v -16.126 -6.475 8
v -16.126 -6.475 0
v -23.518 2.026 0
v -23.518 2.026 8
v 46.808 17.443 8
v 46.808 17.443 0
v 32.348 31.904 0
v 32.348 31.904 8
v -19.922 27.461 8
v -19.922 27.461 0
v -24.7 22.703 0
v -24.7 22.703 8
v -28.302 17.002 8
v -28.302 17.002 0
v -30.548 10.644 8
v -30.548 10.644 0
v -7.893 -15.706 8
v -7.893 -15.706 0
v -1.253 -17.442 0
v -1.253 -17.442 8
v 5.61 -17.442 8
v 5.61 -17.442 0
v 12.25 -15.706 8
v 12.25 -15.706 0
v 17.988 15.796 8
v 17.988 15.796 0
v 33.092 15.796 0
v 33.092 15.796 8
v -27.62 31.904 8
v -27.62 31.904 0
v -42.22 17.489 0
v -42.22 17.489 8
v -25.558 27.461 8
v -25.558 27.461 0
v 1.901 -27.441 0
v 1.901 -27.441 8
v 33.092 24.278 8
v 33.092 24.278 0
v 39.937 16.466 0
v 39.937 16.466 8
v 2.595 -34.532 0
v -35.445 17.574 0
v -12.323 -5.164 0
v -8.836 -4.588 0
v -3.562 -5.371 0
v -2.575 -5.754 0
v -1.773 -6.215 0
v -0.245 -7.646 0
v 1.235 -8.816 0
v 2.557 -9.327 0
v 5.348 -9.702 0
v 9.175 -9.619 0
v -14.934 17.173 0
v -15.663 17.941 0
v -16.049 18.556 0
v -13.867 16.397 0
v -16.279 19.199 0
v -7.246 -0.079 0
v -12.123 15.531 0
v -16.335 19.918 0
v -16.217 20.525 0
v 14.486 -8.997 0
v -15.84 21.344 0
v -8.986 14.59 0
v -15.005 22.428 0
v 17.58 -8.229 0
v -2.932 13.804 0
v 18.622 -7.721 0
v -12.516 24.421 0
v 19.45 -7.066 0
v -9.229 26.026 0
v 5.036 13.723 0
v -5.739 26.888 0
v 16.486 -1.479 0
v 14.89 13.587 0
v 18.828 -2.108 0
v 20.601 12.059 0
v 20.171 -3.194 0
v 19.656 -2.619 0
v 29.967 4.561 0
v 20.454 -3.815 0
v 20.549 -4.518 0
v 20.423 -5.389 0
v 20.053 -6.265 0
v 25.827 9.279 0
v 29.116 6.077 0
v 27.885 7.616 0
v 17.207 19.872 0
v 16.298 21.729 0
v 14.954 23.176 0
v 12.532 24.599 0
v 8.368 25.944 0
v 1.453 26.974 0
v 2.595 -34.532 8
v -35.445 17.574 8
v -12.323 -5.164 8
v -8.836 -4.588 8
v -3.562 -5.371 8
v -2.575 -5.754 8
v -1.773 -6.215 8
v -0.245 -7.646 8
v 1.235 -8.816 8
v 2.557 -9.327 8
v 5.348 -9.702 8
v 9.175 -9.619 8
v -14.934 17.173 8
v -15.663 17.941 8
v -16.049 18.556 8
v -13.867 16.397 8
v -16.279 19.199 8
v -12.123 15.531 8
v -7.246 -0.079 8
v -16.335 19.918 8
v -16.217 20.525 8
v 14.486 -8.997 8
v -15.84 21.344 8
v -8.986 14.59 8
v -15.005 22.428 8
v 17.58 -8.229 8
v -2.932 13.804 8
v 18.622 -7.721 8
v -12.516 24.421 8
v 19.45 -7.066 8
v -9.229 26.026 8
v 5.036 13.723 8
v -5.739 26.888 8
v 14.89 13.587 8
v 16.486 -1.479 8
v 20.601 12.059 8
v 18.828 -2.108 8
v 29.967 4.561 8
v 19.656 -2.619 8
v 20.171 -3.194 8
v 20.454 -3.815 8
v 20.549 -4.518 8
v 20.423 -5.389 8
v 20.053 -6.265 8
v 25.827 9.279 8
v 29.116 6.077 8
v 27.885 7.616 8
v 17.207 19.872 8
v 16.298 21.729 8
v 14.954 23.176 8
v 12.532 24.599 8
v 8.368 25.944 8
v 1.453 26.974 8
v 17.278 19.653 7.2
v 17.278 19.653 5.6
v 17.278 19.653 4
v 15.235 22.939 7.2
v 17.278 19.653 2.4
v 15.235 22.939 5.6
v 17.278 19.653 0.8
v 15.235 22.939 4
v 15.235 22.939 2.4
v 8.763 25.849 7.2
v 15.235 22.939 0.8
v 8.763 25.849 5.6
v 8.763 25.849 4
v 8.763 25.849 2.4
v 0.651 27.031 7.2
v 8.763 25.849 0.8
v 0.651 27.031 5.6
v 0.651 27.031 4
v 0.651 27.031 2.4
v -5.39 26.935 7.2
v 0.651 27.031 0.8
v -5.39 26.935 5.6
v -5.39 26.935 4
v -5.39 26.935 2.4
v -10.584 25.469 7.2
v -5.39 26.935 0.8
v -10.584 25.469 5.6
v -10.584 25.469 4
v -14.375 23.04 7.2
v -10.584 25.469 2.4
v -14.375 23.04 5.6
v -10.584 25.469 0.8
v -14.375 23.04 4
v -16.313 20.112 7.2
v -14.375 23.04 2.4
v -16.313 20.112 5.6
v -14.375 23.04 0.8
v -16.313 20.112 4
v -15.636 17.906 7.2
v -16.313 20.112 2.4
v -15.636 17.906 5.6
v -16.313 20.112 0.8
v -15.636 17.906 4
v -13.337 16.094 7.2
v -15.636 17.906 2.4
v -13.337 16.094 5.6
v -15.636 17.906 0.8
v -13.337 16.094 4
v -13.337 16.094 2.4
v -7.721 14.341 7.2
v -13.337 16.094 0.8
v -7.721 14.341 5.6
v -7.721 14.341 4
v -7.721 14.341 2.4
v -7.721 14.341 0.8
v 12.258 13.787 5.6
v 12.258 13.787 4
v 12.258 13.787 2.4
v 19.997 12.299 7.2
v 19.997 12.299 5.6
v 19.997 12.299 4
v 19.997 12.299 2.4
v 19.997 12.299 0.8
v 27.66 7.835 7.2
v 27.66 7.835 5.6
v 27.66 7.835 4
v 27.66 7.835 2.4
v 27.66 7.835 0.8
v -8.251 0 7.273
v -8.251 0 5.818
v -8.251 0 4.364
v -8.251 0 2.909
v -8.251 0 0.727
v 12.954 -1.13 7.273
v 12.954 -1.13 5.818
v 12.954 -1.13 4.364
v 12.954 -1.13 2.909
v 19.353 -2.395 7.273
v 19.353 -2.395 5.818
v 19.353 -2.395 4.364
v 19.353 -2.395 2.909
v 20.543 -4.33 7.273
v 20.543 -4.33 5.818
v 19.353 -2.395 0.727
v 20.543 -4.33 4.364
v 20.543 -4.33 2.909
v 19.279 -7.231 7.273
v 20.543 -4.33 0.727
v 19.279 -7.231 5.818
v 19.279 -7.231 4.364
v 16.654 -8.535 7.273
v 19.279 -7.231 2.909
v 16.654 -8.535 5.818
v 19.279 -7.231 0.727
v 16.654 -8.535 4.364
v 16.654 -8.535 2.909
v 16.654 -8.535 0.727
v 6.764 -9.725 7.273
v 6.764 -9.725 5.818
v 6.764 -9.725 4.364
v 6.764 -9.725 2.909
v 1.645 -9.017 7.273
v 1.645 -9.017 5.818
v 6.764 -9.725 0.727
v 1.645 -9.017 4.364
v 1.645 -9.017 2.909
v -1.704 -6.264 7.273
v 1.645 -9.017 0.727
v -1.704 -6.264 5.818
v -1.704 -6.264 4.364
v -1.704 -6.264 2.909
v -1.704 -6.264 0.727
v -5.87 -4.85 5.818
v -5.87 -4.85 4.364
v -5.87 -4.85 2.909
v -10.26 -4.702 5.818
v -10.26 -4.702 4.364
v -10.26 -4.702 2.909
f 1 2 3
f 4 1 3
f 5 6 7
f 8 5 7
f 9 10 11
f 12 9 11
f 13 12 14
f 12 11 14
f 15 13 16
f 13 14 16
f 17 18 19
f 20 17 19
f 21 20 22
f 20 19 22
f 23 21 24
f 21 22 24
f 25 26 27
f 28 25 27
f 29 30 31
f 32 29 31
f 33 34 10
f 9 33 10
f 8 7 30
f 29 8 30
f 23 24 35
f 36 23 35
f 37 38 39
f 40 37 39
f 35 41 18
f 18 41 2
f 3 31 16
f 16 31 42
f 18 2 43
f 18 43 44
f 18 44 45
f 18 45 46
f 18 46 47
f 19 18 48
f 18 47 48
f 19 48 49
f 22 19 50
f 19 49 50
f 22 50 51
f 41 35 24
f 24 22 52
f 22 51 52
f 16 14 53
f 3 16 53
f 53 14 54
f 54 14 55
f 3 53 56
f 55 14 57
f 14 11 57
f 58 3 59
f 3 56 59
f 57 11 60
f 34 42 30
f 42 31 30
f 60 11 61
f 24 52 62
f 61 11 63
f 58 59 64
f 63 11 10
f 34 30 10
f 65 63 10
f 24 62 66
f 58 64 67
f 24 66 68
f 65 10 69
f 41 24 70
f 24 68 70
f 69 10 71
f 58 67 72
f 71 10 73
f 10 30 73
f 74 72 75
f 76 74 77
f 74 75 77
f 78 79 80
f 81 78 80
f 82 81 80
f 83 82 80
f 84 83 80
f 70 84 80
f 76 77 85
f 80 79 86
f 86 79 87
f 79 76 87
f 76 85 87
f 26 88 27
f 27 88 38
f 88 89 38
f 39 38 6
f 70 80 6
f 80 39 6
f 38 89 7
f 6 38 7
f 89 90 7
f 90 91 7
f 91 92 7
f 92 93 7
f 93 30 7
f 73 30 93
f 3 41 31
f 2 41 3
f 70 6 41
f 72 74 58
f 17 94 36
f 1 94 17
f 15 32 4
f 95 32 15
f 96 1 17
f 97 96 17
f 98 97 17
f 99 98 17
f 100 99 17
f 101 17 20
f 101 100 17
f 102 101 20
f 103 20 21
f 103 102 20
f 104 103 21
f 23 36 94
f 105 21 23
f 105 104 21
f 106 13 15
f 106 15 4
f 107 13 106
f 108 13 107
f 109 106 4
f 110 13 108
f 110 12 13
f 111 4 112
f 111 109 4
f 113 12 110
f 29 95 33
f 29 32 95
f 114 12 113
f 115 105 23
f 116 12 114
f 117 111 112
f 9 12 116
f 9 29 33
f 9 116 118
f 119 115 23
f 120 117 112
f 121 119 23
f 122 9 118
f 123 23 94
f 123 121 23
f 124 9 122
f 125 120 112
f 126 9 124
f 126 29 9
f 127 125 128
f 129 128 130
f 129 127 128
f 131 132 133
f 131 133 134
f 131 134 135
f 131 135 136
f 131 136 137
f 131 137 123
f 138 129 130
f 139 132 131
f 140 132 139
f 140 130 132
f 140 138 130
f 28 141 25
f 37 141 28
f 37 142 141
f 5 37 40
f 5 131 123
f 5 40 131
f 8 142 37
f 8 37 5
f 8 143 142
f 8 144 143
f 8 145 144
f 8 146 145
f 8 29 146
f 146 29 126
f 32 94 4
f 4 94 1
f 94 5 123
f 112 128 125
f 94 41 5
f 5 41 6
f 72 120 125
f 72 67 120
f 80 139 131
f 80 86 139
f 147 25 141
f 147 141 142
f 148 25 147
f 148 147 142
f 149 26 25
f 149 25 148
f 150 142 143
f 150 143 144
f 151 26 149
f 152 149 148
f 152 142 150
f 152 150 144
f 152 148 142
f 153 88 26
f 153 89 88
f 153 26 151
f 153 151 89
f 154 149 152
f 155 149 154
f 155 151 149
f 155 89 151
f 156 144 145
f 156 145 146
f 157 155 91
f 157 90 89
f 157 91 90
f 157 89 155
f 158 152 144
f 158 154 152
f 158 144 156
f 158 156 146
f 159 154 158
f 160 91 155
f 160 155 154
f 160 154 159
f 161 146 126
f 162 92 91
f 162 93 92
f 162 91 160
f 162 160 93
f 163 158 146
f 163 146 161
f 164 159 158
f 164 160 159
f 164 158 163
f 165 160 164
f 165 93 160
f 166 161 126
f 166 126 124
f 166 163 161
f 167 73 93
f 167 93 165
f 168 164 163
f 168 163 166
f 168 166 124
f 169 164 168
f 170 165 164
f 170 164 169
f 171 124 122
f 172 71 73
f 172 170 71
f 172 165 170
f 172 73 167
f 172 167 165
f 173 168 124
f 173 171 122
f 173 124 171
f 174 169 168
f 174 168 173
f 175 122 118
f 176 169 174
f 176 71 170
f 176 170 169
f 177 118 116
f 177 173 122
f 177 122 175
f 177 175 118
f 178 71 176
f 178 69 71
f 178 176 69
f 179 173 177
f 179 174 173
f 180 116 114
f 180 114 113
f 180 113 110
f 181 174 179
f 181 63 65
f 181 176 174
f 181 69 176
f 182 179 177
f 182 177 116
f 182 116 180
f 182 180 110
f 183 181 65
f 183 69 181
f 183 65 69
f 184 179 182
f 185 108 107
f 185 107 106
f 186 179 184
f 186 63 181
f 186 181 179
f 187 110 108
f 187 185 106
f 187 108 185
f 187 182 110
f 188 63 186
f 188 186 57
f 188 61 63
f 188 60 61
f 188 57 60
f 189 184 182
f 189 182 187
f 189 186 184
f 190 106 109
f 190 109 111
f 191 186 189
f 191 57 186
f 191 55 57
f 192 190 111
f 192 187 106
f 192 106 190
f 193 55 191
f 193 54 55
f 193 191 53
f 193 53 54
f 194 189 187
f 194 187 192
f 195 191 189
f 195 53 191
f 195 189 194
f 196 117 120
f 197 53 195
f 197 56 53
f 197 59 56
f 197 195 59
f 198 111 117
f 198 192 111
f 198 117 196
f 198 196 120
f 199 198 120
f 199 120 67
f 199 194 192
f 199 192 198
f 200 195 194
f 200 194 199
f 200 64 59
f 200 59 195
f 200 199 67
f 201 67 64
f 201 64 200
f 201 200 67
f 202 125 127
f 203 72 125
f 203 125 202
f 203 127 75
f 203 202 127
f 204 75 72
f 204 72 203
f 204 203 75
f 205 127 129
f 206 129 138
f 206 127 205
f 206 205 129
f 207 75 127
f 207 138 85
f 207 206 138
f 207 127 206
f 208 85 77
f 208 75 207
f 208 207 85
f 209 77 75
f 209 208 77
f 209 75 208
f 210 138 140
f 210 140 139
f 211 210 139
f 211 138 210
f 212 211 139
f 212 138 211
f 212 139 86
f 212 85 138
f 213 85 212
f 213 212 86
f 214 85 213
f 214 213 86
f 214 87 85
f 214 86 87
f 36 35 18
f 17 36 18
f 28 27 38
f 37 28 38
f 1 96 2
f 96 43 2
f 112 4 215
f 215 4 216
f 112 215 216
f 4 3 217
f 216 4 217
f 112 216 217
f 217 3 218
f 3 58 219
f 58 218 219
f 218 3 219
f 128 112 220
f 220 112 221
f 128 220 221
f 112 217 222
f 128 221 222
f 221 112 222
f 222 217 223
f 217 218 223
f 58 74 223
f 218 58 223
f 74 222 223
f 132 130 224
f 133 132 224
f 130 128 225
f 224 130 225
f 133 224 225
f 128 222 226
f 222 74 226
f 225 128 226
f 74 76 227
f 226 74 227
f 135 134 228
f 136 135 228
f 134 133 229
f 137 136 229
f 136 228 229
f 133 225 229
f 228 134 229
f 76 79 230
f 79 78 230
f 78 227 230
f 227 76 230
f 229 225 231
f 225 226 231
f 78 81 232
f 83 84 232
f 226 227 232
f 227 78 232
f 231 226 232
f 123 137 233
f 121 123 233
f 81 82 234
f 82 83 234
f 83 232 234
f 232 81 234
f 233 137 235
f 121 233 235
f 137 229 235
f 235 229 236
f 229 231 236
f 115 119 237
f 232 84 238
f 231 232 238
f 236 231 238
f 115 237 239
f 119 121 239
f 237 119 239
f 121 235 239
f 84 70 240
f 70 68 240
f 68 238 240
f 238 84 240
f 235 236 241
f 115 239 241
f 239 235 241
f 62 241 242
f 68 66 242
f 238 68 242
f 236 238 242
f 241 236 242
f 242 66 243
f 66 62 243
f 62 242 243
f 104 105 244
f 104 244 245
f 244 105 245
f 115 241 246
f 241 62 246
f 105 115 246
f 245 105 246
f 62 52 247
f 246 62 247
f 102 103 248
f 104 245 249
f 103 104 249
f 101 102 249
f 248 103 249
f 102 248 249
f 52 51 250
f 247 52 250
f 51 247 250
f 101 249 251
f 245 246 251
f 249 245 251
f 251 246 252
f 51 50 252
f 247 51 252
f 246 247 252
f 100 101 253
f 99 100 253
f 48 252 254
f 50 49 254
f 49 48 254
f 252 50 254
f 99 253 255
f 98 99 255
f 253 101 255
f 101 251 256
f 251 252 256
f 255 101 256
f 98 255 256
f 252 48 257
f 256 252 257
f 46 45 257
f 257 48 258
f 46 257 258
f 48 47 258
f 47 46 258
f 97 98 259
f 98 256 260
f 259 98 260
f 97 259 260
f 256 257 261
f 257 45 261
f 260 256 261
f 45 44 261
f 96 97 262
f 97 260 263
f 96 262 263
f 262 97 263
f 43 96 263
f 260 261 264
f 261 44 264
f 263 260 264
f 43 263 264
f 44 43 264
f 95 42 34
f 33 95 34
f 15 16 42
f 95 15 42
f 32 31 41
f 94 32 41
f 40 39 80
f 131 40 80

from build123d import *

# Parameters (mm, degrees)
F1_DEPTH = 8


with BuildPart() as f1:
    # F0 (on Top) → F1 (new body)
    with BuildSketch(Plane.XY):
        Polygon((32.3477350175, 31.9038629532), (-27.6202764362, 31.9038629532), (-42.2195754945, 17.4893625081), (2.5947312824, -34.5321930945), (46.8084333099, 17.4431619365), align=None)
        with BuildLine():
            Line((1.9010555698, -27.440706268), (-7.8934114426, -15.7058238983))
            ThreePointArc((-7.8934114426, -15.7058238983), (2.1782573313, -17.6621080608), (12.2499261051, -15.7058238983))
            Line((12.2499261051, -15.7058238983), (1.9010555698, -27.440706268))
        make_face(mode=Mode.SUBTRACT)
        with BuildLine():
            Line((-16.1261186004, -6.4751505852), (-23.5181692988, 2.0257078577))
            add(Edge.make_bspline(
                [(-23.5181692988, 2.0257078577), (-18.8492443141, 1.2570925201), (-8.6978031171, -0.4140744889), (12.2317134041, -0.8647353067), (19.3709212644, -1.749249772), (20.9804488697, -4.3052756433), (19.5185531257, -8.1051532438), (12.8471955838, -9.4318160298), (1.1337662191, -10.3548875068), (-1.2619333787, -5.8032125759), (-5.9642189202, -4.7372891241), (-10.3564989081, -4.325924496), (-14.0992906398, -5.7201421507), (-16.1261186004, -6.4751505852)],
                knots=[0, 0, 0, 0, 0.1350048672, 0.2935352303, 0.3813955924, 0.4332440802, 0.4944511627, 0.5840134929, 0.6989534624, 0.7705777041, 0.8427392681, 0.9148388499, 1, 1, 1, 1], degree=3))
        make_face(mode=Mode.SUBTRACT)
        with BuildLine():
            Line((-35.4449935257, 17.5737030804), (-25.5581252277, 27.4605695158))
            Line((-25.5581252277, 27.4605695158), (-19.9216865003, 27.4605695158))
            ThreePointArc((-19.9216865003, 27.4605695158), (-26.6610566726, 19.9533675619), (-30.5477585644, 10.6436554343))
            Line((-30.5477585644, 10.6436554343), (-35.4449935257, 17.5737030804))
        make_face(mode=Mode.SUBTRACT)
        with BuildLine():
            add(Edge.make_bspline(
                [(17.9876312613, 15.7961975783), (17.6628240293, 18.4311832126), (16.881127971, 24.7726611125), (0.1921827326, 27.6753445172), (-10.1347980175, 26.7512644797), (-18.1533216035, 20.3561240489), (-13.225077053, 14.8389045406), (-0.7743203723, 13.2319238927), (12.1945251067, 14.1874403047), (19.79872732, 12.8848882704), (28.0086520453, 8.3239006904), (29.4054772443, 5.6397714004), (29.9668628722, 4.5610168017)],
                knots=[0, 0, 0, 0, 0.0921160459, 0.2216907226, 0.3338230792, 0.4270669755, 0.5015146316, 0.6199375792, 0.7407614293, 0.8342206311, 0.9333730841, 1, 1, 1, 1], degree=3))
            Line((17.9876312613, 15.7961975783), (33.0918803811, 15.7961975783))
            Line((33.0918803811, 15.7961975783), (33.0918803811, 16.6890583932))
            Line((33.0918803811, 16.6890583932), (33.0918803811, 24.2783855647))
            Line((33.0918803811, 24.2783855647), (39.9371534586, 16.4658427238))
            Line((39.9371534586, 16.4658427238), (29.9668628722, 4.5610168017))
        make_face(mode=Mode.SUBTRACT)
    extrude(amount=F1_DEPTH)


solid = f1.part
